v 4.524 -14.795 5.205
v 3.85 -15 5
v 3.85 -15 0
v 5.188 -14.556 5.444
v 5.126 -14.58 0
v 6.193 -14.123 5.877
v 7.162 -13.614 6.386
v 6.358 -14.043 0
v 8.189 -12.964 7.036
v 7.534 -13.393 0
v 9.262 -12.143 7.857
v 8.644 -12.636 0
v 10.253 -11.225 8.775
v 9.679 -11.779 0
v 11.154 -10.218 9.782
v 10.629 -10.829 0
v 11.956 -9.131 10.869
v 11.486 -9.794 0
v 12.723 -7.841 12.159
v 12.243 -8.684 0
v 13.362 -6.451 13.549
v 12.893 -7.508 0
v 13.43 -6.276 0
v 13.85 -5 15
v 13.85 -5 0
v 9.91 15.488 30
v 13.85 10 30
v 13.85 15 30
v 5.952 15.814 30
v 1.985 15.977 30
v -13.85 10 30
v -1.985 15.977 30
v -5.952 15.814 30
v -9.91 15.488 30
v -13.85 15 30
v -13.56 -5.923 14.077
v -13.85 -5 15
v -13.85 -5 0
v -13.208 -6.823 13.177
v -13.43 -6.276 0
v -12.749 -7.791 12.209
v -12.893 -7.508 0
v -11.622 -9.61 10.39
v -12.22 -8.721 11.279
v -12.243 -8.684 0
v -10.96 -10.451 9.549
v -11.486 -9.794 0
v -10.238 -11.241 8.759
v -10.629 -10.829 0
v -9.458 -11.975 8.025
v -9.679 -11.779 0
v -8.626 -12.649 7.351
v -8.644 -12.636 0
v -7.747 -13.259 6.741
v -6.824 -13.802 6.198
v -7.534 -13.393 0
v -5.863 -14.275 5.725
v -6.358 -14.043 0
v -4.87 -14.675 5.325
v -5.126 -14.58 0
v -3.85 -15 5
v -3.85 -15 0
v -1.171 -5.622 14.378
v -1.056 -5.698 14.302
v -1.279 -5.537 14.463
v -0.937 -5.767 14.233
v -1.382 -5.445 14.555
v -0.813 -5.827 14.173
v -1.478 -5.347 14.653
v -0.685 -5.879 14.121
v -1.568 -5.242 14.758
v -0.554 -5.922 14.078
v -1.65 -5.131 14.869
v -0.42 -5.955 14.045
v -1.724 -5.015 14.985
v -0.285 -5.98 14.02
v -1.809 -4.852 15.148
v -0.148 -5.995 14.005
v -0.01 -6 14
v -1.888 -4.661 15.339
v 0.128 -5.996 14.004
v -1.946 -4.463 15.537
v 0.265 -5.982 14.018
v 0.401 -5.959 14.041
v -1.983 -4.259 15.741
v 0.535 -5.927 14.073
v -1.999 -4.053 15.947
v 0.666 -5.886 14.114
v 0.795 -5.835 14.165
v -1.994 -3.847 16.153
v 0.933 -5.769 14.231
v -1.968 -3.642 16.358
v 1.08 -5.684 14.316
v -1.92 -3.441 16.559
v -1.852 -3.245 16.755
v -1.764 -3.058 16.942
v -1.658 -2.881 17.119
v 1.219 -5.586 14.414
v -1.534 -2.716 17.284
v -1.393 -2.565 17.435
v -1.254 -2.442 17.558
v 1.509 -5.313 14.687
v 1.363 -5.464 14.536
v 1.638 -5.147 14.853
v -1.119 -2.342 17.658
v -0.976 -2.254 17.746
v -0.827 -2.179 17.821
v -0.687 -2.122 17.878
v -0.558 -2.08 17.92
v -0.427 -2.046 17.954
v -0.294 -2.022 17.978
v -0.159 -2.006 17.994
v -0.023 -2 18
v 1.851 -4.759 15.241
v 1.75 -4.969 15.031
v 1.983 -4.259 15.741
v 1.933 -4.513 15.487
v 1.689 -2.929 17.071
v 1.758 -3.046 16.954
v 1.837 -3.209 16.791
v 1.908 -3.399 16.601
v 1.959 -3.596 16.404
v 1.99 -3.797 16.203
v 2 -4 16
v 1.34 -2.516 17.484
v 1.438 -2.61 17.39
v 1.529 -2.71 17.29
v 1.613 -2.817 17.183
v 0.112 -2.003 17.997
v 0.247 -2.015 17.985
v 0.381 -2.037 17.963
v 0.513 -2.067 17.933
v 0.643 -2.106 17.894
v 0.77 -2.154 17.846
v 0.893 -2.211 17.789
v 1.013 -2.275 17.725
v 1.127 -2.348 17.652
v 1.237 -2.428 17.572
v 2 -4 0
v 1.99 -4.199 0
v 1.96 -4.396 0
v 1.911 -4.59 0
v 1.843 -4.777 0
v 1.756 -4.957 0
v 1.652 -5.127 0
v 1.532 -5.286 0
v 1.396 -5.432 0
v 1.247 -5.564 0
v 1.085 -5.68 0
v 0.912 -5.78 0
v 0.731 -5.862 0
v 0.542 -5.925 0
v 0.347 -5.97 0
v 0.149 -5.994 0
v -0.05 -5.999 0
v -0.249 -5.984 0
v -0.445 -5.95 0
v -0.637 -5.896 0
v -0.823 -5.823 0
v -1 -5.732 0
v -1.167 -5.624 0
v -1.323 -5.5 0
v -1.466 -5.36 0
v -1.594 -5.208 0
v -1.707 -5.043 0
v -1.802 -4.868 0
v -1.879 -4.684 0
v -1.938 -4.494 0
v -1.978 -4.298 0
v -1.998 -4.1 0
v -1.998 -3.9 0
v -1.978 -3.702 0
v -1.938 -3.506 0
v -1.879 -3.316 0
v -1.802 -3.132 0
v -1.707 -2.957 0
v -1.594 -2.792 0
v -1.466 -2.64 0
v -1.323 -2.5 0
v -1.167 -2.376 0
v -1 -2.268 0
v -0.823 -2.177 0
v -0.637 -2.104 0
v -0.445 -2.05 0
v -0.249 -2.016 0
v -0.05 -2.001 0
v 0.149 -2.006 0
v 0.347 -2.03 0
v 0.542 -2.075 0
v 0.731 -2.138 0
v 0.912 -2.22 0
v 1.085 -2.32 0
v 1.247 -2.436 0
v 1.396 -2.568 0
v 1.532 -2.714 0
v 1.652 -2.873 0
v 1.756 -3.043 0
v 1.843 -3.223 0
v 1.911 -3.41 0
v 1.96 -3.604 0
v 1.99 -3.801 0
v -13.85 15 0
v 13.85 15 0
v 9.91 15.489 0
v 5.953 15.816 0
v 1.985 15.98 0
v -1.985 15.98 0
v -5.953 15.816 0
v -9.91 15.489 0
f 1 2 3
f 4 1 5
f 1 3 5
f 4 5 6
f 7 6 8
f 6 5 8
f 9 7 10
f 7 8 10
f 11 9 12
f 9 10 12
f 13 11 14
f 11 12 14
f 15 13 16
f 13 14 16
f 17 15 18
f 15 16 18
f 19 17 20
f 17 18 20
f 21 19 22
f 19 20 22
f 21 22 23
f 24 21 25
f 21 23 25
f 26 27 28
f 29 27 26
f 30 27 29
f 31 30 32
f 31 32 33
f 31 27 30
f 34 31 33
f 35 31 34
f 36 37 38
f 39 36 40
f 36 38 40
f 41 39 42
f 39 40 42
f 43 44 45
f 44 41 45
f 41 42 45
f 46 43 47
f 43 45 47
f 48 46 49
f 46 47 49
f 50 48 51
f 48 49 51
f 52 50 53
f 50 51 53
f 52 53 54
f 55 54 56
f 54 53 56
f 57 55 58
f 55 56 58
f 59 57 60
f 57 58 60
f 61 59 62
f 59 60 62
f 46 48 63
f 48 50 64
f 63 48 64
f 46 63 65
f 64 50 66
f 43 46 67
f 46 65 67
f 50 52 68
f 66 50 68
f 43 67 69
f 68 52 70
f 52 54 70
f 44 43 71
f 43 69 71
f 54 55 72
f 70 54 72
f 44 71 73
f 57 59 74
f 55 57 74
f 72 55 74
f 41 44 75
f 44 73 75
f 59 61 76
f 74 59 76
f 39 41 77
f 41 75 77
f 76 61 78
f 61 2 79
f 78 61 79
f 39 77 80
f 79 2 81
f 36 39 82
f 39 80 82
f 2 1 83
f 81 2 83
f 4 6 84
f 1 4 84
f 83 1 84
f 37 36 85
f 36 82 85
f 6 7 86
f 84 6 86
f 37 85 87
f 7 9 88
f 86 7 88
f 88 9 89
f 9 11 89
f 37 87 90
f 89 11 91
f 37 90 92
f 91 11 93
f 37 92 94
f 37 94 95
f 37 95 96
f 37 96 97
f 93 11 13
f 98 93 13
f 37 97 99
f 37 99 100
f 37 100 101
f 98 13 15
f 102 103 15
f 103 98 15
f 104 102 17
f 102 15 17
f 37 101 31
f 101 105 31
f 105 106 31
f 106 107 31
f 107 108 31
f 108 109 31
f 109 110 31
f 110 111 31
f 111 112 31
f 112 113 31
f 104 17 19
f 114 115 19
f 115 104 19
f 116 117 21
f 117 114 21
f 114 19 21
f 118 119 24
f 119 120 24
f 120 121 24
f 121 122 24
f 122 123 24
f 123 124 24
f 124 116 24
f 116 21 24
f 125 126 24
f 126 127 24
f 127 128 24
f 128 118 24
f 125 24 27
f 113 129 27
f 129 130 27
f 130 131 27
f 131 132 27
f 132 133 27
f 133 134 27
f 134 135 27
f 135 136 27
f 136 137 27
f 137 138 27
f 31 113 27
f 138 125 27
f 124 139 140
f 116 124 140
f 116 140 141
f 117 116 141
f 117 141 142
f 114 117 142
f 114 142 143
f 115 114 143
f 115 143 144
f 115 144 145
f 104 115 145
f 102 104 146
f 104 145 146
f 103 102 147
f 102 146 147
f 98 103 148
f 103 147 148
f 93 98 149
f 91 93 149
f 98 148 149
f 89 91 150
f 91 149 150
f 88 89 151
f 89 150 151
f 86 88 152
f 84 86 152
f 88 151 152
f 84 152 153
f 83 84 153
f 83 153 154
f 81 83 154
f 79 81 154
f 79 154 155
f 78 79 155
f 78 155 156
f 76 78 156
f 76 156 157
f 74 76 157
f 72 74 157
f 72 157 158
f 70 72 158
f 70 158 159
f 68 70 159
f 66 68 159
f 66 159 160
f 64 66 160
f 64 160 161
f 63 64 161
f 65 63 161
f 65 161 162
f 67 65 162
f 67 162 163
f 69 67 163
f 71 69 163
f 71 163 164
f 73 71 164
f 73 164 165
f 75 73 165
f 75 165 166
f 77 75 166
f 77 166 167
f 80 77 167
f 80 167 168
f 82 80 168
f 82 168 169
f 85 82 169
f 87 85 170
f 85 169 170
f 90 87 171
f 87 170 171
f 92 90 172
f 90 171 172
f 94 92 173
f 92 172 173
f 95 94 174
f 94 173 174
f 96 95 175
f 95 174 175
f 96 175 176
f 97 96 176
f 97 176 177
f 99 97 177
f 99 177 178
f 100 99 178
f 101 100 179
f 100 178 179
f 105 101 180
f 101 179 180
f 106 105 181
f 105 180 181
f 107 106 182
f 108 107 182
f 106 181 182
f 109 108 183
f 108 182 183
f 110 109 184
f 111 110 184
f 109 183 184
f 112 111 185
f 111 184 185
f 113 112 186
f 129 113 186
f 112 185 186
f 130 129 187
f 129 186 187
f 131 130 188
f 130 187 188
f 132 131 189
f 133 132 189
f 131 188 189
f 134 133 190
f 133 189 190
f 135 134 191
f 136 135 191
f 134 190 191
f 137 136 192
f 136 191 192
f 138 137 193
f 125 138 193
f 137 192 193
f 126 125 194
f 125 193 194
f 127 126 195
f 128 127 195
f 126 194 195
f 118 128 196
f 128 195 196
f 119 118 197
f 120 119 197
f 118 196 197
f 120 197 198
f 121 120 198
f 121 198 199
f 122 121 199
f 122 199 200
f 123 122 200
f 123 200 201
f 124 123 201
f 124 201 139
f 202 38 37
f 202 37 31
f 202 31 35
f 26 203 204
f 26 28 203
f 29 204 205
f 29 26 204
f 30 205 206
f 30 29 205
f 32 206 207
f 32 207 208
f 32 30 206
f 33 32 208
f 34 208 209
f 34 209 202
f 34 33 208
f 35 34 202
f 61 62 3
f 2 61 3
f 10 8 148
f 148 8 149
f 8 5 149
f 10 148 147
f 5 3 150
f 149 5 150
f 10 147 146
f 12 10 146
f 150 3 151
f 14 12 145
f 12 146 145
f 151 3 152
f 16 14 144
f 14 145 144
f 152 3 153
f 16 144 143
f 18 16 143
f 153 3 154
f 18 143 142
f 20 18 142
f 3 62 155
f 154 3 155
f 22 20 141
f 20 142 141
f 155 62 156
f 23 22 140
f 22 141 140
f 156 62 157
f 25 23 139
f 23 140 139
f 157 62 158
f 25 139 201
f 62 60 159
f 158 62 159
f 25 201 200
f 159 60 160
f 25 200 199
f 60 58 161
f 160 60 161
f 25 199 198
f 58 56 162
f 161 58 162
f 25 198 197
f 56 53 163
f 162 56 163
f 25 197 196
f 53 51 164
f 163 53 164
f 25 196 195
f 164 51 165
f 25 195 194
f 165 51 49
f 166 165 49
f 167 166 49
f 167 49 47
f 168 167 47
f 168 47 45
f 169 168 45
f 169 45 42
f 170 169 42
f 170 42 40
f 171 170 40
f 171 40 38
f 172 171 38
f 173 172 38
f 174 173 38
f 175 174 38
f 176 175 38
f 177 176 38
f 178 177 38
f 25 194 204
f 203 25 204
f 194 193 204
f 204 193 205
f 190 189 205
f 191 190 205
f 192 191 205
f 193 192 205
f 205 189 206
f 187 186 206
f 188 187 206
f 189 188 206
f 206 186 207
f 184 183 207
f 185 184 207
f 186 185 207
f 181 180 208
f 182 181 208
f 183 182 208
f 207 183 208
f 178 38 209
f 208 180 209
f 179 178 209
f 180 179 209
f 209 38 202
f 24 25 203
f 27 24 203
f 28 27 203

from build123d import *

# Parameters (mm, degrees)
F0_W     = 27.7
F0_H     = 30
F1_DEPTH = 30
F5_DEPTH = 27.701
F6_R     = 2
F7_DEPTH = 30.001


with BuildPart() as f1:
    # F0 (on Top) → F1 (new body)
    with BuildSketch(Plane.XY):
        Rectangle(F0_W, F0_H)
    extrude(amount=F1_DEPTH)

    # F0 (on Top) → F4 section 0
    with BuildSketch(Plane.XY):
        with BuildLine():
            Line((-13.85, 15), (13.85, 15))
            ThreePointArc((13.85, 15), (0, 16), (-13.85, 15))
        make_face()
    # F3 (on face) → F4 section 1
    with BuildSketch(Plane.XY.offset(30)):
        with BuildLine():
            Line((-13.85, 15), (13.85, 15))
            ThreePointArc((13.85, 15), (0, 15.99788), (-13.85, 15))
        make_face()
    loft()

    # F2 (on face) → F5 (cut, through all)
    with BuildSketch(Plane.YZ.offset(13.85)):
        Polygon((-15, 5), (10, 30), (-15, 30), align=None)
    extrude(amount=-F5_DEPTH, mode=Mode.SUBTRACT)

    # F6 (on face) → F7 (cut, through all)
    with BuildSketch(Plane(origin=(0, 0, 0), x_dir=(1, 0, 0), z_dir=(0, 0, -1))):
        with Locations((0, 4)):
            Circle(F6_R)
        with BuildLine():
            Line((13.85, 5), (13.85, 15))
            Line((13.85, 15), (3.85, 15))
            ThreePointArc((3.85, 15), (10.164768, 11.314768), (13.85, 5))
        make_face()
        with BuildLine():
            Line((-13.85, 15), (-13.85, 5))
            ThreePointArc((-13.85, 5), (-10.164768, 11.314768), (-3.85, 15))
            Line((-3.85, 15), (-13.85, 15))
        make_face()
    extrude(amount=-F7_DEPTH, mode=Mode.SUBTRACT)


solid = f1.part
